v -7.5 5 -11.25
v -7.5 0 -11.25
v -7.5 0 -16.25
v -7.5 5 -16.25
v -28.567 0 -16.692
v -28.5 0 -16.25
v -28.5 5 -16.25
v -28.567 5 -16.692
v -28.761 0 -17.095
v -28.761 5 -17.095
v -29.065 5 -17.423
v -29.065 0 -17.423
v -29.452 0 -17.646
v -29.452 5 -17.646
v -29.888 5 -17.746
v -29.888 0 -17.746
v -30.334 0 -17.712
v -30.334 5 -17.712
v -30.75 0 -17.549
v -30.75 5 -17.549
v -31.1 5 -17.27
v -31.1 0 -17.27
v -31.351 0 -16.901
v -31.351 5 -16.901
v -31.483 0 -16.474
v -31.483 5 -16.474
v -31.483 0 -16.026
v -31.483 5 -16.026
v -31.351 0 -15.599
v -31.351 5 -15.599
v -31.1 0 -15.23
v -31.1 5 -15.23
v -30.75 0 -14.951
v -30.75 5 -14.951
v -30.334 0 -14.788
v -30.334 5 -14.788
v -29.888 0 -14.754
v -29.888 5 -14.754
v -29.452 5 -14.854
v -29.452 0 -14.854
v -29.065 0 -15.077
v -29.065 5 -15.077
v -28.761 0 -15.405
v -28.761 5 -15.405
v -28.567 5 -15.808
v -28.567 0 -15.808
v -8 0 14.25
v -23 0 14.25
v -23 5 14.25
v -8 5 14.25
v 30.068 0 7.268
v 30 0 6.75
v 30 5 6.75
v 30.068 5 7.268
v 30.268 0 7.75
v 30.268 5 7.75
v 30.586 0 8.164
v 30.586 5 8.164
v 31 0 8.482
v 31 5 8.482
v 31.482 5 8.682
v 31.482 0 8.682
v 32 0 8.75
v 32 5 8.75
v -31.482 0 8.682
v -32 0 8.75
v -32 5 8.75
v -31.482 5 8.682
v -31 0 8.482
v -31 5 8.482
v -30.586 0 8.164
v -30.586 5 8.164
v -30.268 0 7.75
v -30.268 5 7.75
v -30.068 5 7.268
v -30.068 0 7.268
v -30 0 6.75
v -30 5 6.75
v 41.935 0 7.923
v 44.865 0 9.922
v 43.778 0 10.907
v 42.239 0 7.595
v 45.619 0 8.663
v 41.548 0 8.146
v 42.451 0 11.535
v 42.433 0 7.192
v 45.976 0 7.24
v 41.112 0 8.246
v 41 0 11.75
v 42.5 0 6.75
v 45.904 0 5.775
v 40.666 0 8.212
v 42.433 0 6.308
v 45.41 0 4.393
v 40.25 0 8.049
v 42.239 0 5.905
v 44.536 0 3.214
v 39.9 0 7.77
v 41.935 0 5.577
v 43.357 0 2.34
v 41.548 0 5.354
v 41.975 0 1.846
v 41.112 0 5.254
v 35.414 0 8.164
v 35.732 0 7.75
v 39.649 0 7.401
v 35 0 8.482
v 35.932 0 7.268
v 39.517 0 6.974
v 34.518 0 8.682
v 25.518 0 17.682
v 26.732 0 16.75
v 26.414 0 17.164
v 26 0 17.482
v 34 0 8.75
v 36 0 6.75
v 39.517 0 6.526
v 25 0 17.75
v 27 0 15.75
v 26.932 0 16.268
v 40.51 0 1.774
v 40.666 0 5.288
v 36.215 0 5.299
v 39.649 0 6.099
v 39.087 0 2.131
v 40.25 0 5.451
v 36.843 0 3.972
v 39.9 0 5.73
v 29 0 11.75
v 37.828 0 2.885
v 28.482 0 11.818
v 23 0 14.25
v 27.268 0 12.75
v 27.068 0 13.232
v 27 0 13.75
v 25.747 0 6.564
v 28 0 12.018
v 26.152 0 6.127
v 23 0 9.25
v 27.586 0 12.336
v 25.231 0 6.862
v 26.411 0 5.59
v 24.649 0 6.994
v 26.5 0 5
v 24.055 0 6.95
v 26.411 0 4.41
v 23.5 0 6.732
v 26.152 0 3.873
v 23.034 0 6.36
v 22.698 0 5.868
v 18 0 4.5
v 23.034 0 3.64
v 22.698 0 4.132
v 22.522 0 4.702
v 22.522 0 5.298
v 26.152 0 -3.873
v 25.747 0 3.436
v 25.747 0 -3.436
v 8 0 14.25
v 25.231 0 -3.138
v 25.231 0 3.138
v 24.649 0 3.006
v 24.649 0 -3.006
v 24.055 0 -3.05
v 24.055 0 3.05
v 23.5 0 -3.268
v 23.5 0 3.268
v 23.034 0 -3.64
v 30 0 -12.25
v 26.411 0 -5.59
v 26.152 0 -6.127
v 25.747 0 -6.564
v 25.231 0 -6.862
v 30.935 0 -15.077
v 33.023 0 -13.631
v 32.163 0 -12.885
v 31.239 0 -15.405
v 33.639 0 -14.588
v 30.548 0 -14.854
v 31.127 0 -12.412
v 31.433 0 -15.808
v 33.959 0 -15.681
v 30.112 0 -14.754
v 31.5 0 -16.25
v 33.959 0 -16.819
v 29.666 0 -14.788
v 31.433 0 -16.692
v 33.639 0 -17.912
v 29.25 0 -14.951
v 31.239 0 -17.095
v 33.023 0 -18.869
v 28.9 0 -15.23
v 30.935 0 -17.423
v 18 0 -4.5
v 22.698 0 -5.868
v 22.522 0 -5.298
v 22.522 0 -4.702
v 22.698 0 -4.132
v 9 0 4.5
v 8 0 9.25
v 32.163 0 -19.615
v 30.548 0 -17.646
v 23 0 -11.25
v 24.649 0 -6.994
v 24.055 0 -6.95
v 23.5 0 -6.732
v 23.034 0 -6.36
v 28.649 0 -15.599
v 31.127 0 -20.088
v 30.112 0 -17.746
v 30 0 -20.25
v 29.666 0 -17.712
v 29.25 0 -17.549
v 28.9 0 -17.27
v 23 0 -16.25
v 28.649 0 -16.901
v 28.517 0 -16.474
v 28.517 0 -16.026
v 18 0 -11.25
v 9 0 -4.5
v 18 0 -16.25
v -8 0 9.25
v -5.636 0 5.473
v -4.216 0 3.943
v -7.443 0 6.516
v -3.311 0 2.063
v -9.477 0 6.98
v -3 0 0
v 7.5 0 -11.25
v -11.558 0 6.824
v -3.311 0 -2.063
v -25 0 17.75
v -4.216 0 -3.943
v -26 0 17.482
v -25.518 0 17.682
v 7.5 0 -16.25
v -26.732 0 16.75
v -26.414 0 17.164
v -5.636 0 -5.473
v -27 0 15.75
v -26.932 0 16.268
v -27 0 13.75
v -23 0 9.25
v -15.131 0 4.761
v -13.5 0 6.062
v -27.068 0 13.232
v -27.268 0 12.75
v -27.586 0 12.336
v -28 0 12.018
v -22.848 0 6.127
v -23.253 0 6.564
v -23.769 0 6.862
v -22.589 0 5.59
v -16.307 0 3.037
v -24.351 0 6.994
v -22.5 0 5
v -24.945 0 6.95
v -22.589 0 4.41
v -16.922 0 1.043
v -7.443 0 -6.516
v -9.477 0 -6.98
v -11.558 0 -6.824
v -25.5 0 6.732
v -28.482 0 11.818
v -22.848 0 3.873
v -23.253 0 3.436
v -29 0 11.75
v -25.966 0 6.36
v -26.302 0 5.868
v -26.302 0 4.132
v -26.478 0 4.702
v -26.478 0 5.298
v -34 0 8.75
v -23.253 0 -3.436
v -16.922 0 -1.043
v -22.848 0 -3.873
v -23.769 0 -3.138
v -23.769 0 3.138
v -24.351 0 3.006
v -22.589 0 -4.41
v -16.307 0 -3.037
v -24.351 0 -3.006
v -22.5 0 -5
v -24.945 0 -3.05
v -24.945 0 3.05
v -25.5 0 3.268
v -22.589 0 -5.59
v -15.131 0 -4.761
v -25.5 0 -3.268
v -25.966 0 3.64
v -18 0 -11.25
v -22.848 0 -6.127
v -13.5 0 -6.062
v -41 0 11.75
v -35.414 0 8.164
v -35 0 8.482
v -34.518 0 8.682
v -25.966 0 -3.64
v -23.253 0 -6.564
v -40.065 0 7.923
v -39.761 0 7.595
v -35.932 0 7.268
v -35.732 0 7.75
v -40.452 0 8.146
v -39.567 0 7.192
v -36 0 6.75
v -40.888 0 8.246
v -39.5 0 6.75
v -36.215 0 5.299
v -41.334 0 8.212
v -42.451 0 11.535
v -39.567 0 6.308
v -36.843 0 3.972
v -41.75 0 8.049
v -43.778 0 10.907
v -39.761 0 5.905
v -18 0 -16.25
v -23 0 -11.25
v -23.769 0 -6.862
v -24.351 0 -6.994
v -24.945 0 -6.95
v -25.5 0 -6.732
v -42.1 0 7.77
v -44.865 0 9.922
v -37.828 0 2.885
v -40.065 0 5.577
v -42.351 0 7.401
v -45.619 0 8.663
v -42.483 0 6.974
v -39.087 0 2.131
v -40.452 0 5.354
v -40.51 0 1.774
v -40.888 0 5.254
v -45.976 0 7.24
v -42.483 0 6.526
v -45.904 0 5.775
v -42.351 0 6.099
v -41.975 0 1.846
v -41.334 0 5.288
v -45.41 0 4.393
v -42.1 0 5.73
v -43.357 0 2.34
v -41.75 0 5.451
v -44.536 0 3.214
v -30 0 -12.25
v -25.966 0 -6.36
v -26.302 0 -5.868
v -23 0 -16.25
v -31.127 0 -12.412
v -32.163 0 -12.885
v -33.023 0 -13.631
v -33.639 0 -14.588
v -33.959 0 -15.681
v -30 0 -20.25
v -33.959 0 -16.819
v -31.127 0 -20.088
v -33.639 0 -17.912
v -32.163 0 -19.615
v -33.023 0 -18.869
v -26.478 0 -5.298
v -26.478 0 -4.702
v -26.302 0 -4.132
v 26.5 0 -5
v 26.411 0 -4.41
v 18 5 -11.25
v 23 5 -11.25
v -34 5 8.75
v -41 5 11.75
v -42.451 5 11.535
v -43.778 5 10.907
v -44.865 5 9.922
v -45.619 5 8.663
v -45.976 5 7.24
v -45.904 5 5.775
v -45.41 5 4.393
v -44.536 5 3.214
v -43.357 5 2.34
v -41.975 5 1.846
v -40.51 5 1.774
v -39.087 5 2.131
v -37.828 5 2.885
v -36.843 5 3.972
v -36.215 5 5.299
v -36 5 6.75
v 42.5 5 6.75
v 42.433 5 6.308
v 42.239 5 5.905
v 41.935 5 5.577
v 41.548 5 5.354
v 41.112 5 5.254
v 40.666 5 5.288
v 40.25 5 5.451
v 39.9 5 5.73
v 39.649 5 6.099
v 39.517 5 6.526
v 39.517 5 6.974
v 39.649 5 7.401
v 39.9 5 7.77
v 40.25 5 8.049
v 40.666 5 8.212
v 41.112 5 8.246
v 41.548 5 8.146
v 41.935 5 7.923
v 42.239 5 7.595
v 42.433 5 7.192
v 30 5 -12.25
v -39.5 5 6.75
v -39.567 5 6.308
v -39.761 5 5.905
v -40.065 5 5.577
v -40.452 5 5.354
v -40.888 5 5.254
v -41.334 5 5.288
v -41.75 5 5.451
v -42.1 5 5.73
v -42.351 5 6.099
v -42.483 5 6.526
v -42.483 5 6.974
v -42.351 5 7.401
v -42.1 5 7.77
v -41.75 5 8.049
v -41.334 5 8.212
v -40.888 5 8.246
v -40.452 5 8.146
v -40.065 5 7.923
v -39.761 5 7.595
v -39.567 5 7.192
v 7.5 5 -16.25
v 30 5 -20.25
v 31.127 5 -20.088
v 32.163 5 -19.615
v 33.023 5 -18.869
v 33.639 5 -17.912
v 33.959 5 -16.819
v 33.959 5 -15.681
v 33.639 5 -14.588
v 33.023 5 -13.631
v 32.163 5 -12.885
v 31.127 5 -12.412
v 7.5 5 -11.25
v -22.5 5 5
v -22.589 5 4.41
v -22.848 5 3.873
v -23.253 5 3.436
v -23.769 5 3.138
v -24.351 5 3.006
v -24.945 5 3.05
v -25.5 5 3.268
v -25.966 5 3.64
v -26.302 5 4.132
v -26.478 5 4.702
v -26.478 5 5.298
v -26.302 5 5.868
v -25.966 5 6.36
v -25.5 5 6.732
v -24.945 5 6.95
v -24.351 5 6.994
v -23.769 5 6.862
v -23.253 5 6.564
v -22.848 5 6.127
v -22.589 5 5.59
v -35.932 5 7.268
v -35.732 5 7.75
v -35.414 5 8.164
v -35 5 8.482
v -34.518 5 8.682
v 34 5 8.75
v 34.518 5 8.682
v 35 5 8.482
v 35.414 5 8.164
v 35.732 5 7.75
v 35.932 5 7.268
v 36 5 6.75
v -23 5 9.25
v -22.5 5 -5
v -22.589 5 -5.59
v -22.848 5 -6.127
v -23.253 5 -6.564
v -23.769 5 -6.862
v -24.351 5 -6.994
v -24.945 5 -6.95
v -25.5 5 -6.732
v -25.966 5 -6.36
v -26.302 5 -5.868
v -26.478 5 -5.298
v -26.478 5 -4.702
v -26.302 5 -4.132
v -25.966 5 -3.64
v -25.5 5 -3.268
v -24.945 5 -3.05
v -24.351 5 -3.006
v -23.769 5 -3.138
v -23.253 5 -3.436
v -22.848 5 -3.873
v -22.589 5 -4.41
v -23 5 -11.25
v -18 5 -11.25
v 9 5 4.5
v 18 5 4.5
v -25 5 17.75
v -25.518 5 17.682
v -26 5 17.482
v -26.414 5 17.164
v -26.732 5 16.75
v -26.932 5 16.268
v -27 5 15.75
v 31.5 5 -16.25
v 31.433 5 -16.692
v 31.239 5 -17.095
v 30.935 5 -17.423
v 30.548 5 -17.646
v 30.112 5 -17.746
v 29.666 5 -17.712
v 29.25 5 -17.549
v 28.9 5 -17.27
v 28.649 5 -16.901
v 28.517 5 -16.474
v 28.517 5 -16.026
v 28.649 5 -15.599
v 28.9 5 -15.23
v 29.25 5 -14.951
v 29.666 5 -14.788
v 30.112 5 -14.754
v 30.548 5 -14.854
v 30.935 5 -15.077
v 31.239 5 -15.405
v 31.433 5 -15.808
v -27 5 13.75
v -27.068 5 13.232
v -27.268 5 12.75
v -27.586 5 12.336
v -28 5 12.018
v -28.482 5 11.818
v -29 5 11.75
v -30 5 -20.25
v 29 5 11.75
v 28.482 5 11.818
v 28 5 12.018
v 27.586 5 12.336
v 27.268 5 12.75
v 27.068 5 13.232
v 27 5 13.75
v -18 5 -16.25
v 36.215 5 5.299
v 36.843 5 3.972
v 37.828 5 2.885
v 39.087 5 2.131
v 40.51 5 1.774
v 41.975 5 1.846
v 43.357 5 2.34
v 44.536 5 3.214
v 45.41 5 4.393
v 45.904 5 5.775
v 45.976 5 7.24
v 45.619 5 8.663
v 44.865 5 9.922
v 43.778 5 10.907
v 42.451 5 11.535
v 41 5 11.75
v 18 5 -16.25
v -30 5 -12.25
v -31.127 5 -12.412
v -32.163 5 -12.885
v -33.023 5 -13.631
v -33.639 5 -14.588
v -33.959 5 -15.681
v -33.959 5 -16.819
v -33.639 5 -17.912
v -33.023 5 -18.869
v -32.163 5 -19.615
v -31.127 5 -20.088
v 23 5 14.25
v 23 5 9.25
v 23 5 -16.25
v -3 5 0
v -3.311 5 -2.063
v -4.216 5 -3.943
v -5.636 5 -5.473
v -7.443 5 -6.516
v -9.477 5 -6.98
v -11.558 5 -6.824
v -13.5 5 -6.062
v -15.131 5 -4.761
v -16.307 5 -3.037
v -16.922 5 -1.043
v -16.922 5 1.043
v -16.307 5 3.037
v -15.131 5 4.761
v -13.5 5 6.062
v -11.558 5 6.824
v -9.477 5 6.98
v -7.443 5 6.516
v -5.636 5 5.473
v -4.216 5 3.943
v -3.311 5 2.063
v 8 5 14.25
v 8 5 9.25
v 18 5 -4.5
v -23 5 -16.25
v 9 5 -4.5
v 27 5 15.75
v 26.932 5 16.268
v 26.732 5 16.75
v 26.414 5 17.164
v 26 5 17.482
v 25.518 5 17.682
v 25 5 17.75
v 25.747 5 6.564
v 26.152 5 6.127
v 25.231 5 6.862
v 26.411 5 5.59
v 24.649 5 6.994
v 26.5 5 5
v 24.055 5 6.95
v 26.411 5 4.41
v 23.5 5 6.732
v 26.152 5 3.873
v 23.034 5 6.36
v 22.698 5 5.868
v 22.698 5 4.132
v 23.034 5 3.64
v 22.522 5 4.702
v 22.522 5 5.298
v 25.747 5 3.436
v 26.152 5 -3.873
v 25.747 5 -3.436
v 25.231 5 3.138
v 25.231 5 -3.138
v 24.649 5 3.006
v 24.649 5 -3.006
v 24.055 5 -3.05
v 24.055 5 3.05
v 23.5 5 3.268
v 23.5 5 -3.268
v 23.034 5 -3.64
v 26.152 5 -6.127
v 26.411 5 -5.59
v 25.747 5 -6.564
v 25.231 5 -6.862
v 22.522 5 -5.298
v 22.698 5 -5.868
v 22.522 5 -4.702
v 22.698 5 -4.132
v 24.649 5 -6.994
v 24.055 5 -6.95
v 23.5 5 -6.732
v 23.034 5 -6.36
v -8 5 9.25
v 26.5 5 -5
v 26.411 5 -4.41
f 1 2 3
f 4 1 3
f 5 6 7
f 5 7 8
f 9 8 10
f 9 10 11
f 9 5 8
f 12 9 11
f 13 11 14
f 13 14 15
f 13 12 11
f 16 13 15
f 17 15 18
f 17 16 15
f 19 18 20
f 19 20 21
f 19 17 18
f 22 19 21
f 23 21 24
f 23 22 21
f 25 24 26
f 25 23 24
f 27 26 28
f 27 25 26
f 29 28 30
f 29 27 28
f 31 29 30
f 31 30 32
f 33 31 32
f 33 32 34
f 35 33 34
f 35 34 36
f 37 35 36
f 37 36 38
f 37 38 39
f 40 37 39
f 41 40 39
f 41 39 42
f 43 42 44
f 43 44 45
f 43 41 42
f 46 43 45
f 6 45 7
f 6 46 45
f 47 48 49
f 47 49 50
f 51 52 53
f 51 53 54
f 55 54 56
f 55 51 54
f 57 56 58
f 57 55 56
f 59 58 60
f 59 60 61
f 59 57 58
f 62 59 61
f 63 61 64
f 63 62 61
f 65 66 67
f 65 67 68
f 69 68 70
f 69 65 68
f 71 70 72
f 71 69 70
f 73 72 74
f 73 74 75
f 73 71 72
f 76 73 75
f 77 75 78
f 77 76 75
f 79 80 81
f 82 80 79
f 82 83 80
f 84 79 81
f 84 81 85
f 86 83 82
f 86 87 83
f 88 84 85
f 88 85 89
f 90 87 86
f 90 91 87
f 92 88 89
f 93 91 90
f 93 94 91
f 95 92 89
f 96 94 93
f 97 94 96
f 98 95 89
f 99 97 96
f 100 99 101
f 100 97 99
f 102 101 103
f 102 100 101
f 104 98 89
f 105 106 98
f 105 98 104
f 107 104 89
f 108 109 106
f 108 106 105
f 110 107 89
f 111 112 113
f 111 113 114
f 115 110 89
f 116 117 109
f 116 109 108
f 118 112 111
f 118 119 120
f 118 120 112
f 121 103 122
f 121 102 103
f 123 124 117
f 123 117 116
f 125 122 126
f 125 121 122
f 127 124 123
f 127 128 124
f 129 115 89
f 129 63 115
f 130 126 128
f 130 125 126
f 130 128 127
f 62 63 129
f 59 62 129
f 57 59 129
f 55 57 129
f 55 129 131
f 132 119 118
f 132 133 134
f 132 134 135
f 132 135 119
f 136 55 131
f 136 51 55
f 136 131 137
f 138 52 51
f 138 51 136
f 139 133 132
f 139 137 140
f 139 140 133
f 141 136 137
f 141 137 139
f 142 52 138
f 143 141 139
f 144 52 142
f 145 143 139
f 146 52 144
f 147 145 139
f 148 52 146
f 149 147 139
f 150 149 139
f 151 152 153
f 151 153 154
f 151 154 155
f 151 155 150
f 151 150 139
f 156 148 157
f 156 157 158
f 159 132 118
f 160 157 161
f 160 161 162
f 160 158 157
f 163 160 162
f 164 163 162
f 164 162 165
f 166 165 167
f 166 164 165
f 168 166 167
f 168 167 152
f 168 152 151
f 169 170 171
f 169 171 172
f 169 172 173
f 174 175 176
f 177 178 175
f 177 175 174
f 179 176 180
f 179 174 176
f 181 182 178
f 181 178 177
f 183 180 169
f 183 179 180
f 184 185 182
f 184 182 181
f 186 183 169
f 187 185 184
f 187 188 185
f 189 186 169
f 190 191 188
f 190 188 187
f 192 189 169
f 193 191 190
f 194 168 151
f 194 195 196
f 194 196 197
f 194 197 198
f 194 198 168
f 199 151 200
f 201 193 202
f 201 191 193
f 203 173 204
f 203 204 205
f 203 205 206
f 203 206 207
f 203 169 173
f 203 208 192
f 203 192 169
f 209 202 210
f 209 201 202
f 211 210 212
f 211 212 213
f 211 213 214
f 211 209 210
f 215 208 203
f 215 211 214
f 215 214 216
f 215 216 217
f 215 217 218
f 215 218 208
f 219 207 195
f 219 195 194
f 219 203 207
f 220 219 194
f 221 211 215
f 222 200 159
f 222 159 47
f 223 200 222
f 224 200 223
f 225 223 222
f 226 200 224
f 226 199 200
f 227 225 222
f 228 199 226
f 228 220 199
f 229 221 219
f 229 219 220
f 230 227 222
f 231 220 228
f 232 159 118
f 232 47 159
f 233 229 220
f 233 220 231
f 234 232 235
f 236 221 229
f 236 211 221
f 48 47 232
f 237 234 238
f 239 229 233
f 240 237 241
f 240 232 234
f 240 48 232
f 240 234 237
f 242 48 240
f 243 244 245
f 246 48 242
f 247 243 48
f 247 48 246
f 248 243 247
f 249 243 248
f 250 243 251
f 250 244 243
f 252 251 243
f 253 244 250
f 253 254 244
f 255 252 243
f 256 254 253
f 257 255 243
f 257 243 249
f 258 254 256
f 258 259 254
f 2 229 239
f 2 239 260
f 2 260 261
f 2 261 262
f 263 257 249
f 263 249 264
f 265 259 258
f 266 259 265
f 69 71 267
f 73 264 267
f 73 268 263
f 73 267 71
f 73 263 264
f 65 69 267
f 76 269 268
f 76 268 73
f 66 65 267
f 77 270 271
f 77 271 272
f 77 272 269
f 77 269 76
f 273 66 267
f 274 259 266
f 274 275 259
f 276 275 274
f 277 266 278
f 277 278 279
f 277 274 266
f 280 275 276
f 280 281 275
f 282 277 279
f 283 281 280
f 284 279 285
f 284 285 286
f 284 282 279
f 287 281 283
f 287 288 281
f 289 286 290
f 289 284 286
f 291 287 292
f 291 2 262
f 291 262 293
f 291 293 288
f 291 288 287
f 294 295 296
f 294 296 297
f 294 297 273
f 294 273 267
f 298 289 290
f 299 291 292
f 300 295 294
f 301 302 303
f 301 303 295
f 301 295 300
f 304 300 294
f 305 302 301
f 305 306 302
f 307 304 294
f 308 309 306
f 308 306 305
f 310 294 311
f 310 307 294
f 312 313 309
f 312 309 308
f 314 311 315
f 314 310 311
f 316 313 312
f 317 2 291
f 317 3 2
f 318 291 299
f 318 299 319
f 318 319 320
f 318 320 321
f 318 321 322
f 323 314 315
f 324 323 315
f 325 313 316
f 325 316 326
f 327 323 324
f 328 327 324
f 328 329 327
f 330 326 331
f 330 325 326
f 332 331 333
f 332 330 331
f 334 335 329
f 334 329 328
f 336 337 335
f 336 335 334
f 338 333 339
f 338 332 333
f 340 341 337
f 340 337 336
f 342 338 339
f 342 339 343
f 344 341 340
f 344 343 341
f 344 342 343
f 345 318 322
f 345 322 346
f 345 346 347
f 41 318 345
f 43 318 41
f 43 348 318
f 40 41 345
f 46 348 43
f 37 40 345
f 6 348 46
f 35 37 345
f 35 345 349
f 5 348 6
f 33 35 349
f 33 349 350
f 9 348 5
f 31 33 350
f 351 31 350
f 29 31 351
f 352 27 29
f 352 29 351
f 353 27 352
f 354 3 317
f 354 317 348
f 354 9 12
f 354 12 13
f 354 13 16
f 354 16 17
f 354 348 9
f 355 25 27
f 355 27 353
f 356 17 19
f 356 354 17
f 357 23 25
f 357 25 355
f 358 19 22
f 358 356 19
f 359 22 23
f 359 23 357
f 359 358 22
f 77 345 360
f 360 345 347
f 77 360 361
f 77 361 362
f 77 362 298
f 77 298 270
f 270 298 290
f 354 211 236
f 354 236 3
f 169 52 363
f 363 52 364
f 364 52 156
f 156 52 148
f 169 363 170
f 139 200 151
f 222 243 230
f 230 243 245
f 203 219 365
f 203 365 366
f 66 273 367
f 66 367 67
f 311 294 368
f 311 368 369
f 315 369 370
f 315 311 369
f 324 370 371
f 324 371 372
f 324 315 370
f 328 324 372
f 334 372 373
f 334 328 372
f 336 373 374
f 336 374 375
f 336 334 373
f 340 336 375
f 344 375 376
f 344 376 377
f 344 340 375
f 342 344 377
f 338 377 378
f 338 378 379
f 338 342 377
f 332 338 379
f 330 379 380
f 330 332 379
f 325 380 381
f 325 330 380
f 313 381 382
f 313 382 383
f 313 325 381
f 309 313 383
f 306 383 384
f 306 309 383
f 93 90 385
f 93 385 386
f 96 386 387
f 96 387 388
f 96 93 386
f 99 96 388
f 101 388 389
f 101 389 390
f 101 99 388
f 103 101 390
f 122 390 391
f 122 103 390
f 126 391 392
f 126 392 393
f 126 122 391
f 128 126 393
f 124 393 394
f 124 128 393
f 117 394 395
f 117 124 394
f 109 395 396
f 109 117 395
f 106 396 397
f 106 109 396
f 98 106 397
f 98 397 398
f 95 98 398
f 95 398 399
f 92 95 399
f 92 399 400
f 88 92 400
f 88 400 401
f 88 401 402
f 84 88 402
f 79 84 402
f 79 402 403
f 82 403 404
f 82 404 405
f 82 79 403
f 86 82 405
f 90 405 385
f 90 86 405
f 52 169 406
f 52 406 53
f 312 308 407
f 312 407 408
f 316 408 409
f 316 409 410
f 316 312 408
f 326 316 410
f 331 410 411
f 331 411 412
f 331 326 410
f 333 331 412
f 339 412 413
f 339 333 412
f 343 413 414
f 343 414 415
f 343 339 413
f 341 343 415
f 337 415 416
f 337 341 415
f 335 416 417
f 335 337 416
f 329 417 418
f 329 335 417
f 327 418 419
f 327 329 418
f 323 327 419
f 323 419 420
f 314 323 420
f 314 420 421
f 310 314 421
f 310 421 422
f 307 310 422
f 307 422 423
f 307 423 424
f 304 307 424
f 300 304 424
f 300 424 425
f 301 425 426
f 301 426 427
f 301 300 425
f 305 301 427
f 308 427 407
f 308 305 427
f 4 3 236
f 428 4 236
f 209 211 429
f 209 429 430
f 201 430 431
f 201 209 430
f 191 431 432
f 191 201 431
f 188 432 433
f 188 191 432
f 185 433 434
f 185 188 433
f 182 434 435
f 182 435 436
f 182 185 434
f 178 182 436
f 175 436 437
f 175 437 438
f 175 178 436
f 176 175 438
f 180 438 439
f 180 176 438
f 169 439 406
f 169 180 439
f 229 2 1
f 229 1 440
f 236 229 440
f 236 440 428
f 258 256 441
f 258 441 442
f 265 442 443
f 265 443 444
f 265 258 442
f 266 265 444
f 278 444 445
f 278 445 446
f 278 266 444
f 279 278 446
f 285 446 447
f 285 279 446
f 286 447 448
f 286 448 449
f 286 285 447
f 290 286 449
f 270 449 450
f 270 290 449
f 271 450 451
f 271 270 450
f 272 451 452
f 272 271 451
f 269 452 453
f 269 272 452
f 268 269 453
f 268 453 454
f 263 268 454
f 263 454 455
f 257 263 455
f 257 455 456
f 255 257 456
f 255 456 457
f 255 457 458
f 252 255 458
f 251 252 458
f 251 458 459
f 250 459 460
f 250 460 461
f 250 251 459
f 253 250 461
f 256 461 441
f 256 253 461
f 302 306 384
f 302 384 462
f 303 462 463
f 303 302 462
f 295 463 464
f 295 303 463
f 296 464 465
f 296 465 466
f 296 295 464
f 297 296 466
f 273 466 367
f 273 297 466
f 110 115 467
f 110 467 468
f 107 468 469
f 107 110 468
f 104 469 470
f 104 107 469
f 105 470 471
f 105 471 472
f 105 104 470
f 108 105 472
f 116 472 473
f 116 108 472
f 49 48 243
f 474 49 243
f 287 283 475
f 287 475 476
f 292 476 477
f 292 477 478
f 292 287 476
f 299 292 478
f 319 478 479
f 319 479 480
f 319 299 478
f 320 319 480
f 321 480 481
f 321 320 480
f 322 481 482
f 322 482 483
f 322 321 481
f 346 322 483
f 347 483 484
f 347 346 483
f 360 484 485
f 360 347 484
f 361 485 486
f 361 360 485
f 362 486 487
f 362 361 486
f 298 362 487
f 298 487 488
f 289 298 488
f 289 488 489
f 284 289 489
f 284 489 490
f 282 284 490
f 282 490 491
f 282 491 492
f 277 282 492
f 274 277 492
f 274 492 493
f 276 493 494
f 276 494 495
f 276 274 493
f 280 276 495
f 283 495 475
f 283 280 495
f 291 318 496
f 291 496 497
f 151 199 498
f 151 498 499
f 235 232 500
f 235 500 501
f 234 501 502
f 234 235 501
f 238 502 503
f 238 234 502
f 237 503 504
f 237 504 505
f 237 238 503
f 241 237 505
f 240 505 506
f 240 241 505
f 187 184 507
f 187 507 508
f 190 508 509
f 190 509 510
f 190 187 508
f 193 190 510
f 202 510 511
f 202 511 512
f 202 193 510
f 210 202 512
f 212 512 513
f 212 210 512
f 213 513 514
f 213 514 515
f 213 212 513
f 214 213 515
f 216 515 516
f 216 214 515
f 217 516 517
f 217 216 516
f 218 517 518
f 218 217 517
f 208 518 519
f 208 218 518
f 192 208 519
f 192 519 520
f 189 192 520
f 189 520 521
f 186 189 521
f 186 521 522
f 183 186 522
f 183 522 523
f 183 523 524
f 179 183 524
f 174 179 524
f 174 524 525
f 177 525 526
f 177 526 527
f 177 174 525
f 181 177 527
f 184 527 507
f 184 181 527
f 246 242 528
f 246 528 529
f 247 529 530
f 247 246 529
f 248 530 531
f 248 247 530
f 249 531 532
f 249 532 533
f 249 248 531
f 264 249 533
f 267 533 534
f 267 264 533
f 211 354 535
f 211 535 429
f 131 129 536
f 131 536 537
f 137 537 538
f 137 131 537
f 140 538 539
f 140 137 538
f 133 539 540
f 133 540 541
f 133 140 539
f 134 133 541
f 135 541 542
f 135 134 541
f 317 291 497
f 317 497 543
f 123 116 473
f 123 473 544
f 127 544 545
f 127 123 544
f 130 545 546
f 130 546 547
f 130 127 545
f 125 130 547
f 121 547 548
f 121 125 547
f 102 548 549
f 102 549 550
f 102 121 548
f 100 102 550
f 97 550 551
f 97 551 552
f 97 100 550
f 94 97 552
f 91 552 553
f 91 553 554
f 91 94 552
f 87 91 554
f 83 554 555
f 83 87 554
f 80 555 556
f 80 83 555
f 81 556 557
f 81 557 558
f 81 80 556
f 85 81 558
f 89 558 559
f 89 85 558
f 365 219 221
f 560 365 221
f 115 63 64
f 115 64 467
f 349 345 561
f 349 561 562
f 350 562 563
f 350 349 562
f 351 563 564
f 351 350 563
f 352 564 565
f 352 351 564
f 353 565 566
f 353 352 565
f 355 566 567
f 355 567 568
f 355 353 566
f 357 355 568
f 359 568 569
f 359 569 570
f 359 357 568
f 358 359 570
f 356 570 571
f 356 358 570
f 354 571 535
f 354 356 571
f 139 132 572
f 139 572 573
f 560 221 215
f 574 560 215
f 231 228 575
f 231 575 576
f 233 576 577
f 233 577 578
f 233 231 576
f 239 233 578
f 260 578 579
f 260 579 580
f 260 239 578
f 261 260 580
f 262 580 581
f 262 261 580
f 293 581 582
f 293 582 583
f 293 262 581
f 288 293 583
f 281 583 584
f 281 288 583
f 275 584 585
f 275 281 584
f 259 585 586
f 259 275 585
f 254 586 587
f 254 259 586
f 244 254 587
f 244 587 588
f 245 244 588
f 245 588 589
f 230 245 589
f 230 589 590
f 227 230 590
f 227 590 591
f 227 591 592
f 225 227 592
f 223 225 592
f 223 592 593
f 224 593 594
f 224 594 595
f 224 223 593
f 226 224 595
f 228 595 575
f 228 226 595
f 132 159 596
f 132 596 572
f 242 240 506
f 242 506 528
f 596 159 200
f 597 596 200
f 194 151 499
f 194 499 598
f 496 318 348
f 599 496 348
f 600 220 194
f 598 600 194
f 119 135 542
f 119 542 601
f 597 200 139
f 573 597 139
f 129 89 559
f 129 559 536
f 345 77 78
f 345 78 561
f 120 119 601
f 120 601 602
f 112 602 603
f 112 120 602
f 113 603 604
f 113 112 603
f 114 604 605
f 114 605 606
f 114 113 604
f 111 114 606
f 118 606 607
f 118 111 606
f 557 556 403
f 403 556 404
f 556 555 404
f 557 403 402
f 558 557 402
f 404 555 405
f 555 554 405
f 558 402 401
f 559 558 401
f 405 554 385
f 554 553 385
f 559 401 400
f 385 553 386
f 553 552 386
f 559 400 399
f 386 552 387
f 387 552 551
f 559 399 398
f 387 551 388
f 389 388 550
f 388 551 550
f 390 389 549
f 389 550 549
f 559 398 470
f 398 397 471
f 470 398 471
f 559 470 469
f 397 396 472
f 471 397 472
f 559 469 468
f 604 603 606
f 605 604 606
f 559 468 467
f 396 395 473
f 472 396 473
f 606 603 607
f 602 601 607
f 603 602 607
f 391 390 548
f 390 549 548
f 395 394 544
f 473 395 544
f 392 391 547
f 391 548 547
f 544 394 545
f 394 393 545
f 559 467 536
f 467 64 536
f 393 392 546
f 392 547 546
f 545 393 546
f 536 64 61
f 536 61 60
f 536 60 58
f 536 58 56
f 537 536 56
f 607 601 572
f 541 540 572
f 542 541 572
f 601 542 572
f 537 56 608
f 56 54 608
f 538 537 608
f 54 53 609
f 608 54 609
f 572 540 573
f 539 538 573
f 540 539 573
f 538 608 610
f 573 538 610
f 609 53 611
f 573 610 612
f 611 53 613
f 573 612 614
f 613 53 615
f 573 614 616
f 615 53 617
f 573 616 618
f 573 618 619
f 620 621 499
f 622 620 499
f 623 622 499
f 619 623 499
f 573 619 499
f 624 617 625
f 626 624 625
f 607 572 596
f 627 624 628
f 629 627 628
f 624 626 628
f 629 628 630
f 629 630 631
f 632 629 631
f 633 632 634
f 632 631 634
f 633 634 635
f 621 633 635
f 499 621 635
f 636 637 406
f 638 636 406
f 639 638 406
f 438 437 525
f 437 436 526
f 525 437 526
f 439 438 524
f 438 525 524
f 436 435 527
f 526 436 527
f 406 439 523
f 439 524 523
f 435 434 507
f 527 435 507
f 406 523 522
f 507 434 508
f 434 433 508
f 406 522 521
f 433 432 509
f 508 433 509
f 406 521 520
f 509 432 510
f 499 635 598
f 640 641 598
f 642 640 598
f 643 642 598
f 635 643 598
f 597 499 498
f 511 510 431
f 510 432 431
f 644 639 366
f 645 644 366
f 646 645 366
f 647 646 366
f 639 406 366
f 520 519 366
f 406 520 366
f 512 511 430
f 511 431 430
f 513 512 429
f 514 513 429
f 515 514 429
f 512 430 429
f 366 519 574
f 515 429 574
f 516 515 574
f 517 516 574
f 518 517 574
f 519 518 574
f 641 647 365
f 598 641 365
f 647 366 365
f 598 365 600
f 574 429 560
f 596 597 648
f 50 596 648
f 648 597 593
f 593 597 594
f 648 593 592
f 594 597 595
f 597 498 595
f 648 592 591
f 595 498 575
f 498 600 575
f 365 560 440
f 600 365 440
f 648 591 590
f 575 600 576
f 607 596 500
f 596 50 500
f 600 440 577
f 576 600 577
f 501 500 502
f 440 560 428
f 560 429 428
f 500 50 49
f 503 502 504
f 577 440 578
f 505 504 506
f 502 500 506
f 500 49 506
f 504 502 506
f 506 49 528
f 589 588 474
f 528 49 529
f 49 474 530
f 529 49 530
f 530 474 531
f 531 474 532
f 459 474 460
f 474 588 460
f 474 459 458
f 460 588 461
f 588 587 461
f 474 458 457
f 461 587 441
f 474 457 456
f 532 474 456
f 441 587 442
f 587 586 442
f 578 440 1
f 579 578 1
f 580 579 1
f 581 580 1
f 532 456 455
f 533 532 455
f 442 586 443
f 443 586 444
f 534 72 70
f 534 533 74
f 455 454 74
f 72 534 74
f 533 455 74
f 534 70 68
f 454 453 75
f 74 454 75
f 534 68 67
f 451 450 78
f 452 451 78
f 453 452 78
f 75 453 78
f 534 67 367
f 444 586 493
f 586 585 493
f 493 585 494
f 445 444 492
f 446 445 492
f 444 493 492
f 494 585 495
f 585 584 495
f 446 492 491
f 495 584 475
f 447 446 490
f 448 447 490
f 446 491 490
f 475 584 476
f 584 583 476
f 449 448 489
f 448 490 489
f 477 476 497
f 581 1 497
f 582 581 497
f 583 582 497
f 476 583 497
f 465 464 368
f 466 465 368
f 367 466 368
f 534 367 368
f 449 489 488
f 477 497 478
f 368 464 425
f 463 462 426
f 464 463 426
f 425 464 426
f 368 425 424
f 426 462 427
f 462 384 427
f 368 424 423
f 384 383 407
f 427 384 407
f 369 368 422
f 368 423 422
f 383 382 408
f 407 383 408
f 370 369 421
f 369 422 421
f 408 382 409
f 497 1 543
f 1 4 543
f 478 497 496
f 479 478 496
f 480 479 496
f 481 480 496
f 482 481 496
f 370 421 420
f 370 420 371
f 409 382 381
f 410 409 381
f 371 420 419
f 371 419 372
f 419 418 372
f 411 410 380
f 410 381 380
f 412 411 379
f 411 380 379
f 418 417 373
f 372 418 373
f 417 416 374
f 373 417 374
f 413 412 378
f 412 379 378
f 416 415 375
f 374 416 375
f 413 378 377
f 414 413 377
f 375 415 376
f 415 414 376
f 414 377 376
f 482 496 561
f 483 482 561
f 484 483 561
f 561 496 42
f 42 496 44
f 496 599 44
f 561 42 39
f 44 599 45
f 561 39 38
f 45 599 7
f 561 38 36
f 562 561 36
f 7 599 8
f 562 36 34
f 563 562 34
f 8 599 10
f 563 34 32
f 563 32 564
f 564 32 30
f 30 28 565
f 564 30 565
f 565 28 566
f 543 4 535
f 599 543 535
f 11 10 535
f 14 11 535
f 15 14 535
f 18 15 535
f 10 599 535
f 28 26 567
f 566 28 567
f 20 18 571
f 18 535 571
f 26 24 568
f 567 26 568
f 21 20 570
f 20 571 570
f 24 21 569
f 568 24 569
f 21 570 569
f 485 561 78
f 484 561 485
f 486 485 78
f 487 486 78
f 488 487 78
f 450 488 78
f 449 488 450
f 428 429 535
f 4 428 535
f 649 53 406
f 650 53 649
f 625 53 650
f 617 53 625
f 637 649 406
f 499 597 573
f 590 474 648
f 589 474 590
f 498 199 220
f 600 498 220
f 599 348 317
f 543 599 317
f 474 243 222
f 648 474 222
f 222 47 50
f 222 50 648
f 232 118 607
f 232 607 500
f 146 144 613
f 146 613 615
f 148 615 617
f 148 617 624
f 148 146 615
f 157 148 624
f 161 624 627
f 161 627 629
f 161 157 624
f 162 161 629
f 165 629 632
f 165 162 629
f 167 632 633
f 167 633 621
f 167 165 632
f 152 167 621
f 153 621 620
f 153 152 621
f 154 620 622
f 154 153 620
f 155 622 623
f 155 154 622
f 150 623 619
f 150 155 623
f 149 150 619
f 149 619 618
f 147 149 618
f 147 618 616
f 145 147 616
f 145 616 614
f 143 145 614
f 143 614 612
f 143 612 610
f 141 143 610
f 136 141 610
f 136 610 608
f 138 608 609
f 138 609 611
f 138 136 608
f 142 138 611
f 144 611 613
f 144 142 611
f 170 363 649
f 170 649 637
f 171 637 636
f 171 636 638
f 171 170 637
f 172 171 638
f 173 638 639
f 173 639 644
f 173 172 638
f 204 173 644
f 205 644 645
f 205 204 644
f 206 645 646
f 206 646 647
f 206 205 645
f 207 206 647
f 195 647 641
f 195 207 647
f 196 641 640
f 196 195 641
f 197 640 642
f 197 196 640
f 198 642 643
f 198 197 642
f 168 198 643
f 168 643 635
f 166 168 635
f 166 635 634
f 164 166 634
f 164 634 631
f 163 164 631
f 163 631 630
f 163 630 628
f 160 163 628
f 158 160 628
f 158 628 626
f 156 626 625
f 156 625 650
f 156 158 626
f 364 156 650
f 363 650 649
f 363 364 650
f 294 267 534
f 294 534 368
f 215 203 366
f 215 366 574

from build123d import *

# Parameters (mm, degrees)
SKETCH1_R           = 7
SKETCH1_R_2         = 1.5
SKETCH1_R_3         = 2
SKETCH1_W           = 5
SKETCH1_H           = 5
SKETCH1_W_2         = 15
SKETCH1_W_3         = 9
SKETCH1_H_2         = 9
BOSS_EXTRUDE1_DEPTH = 5


with BuildPart() as part:
    # Sketch1 → Boss-Extrude1 (new body)
    with BuildSketch(Plane(origin=(0, 0, 0), x_dir=(1, 0, 0), z_dir=(0, 1, 0))):
        with BuildLine():
            Line((-29, -11.75), (-30, -11.75))
            Line((-30, -11.75), (-41, -11.75))
            ThreePointArc((-41, -11.75), (-44.535533906, -3.214466094), (-36, -6.75))
            ThreePointArc((-36, -6.75), (-35.414213562, -8.164213562), (-34, -8.75))
            Line((-34, -8.75), (-32, -8.75))
            ThreePointArc((-32, -8.75), (-30.585786438, -8.164213562), (-30, -6.75))
            Line((-30, -6.75), (-30, 12.25))
            ThreePointArc((-30, 12.25), (-34, 16.25), (-30, 20.25))
            Line((-30, 20.25), (30, 20.25))
            ThreePointArc((30, 20.25), (34, 16.25), (30, 12.25))
            Line((30, 12.25), (30, -6.75))
            ThreePointArc((30, -6.75), (30.585786438, -8.164213562), (32, -8.75))
            Line((32, -8.75), (34, -8.75))
            ThreePointArc((34, -8.75), (35.414213562, -8.164213562), (36, -6.75))
            ThreePointArc((36, -6.75), (44.535533906, -3.214466094), (41, -11.75))
            Line((41, -11.75), (30, -11.75))
            Line((30, -11.75), (29, -11.75))
            ThreePointArc((29, -11.75), (27.585786438, -12.335786438), (27, -13.75))
            Line((27, -13.75), (27, -15.75))
            ThreePointArc((27, -15.75), (26.414213562, -17.164213562), (25, -17.75))
            Line((25, -17.75), (-25, -17.75))
            ThreePointArc((-25, -17.75), (-26.414213562, -17.164213562), (-27, -15.75))
            Line((-27, -15.75), (-27, -13.75))
            ThreePointArc((-27, -13.75), (-27.585786438, -12.335786438), (-29, -11.75))
        make_face()
        with Locations((-10, 0)):
            Circle(SKETCH1_R, mode=Mode.SUBTRACT)
        with Locations((-30, 16.25)):
            Circle(SKETCH1_R_2, mode=Mode.SUBTRACT)
        with Locations((30, 16.25)):
            Circle(SKETCH1_R_2, mode=Mode.SUBTRACT)
        with Locations((41, -6.75)):
            Circle(SKETCH1_R_2, mode=Mode.SUBTRACT)
        with Locations((-41, -6.75)):
            Circle(SKETCH1_R_2, mode=Mode.SUBTRACT)
        with Locations((-24.5, -5)):
            Circle(SKETCH1_R_3, mode=Mode.SUBTRACT)
        with Locations((24.5, -5)):
            Circle(SKETCH1_R_3, mode=Mode.SUBTRACT)
        with Locations((-24.5, 5)):
            Circle(SKETCH1_R_3, mode=Mode.SUBTRACT)
        with Locations((24.5, 5)):
            Circle(SKETCH1_R_3, mode=Mode.SUBTRACT)
        with Locations((-20.5, 13.75)):
            Rectangle(SKETCH1_W, SKETCH1_H, mode=Mode.SUBTRACT)
        with Locations((0, 13.75)):
            Rectangle(SKETCH1_W_2, SKETCH1_H, mode=Mode.SUBTRACT)
        with Locations((20.5, 13.75)):
            Rectangle(SKETCH1_W, SKETCH1_H, mode=Mode.SUBTRACT)
        with Locations((-15.5, -11.75)):
            Rectangle(SKETCH1_W_2, SKETCH1_H, mode=Mode.SUBTRACT)
        with Locations((15.5, -11.75)):
            Rectangle(SKETCH1_W_2, SKETCH1_H, mode=Mode.SUBTRACT)
        with Locations((13.5, 0)):
            Rectangle(SKETCH1_W_3, SKETCH1_H_2, mode=Mode.SUBTRACT)
    extrude(amount=BOSS_EXTRUDE1_DEPTH)


solid = part.part
